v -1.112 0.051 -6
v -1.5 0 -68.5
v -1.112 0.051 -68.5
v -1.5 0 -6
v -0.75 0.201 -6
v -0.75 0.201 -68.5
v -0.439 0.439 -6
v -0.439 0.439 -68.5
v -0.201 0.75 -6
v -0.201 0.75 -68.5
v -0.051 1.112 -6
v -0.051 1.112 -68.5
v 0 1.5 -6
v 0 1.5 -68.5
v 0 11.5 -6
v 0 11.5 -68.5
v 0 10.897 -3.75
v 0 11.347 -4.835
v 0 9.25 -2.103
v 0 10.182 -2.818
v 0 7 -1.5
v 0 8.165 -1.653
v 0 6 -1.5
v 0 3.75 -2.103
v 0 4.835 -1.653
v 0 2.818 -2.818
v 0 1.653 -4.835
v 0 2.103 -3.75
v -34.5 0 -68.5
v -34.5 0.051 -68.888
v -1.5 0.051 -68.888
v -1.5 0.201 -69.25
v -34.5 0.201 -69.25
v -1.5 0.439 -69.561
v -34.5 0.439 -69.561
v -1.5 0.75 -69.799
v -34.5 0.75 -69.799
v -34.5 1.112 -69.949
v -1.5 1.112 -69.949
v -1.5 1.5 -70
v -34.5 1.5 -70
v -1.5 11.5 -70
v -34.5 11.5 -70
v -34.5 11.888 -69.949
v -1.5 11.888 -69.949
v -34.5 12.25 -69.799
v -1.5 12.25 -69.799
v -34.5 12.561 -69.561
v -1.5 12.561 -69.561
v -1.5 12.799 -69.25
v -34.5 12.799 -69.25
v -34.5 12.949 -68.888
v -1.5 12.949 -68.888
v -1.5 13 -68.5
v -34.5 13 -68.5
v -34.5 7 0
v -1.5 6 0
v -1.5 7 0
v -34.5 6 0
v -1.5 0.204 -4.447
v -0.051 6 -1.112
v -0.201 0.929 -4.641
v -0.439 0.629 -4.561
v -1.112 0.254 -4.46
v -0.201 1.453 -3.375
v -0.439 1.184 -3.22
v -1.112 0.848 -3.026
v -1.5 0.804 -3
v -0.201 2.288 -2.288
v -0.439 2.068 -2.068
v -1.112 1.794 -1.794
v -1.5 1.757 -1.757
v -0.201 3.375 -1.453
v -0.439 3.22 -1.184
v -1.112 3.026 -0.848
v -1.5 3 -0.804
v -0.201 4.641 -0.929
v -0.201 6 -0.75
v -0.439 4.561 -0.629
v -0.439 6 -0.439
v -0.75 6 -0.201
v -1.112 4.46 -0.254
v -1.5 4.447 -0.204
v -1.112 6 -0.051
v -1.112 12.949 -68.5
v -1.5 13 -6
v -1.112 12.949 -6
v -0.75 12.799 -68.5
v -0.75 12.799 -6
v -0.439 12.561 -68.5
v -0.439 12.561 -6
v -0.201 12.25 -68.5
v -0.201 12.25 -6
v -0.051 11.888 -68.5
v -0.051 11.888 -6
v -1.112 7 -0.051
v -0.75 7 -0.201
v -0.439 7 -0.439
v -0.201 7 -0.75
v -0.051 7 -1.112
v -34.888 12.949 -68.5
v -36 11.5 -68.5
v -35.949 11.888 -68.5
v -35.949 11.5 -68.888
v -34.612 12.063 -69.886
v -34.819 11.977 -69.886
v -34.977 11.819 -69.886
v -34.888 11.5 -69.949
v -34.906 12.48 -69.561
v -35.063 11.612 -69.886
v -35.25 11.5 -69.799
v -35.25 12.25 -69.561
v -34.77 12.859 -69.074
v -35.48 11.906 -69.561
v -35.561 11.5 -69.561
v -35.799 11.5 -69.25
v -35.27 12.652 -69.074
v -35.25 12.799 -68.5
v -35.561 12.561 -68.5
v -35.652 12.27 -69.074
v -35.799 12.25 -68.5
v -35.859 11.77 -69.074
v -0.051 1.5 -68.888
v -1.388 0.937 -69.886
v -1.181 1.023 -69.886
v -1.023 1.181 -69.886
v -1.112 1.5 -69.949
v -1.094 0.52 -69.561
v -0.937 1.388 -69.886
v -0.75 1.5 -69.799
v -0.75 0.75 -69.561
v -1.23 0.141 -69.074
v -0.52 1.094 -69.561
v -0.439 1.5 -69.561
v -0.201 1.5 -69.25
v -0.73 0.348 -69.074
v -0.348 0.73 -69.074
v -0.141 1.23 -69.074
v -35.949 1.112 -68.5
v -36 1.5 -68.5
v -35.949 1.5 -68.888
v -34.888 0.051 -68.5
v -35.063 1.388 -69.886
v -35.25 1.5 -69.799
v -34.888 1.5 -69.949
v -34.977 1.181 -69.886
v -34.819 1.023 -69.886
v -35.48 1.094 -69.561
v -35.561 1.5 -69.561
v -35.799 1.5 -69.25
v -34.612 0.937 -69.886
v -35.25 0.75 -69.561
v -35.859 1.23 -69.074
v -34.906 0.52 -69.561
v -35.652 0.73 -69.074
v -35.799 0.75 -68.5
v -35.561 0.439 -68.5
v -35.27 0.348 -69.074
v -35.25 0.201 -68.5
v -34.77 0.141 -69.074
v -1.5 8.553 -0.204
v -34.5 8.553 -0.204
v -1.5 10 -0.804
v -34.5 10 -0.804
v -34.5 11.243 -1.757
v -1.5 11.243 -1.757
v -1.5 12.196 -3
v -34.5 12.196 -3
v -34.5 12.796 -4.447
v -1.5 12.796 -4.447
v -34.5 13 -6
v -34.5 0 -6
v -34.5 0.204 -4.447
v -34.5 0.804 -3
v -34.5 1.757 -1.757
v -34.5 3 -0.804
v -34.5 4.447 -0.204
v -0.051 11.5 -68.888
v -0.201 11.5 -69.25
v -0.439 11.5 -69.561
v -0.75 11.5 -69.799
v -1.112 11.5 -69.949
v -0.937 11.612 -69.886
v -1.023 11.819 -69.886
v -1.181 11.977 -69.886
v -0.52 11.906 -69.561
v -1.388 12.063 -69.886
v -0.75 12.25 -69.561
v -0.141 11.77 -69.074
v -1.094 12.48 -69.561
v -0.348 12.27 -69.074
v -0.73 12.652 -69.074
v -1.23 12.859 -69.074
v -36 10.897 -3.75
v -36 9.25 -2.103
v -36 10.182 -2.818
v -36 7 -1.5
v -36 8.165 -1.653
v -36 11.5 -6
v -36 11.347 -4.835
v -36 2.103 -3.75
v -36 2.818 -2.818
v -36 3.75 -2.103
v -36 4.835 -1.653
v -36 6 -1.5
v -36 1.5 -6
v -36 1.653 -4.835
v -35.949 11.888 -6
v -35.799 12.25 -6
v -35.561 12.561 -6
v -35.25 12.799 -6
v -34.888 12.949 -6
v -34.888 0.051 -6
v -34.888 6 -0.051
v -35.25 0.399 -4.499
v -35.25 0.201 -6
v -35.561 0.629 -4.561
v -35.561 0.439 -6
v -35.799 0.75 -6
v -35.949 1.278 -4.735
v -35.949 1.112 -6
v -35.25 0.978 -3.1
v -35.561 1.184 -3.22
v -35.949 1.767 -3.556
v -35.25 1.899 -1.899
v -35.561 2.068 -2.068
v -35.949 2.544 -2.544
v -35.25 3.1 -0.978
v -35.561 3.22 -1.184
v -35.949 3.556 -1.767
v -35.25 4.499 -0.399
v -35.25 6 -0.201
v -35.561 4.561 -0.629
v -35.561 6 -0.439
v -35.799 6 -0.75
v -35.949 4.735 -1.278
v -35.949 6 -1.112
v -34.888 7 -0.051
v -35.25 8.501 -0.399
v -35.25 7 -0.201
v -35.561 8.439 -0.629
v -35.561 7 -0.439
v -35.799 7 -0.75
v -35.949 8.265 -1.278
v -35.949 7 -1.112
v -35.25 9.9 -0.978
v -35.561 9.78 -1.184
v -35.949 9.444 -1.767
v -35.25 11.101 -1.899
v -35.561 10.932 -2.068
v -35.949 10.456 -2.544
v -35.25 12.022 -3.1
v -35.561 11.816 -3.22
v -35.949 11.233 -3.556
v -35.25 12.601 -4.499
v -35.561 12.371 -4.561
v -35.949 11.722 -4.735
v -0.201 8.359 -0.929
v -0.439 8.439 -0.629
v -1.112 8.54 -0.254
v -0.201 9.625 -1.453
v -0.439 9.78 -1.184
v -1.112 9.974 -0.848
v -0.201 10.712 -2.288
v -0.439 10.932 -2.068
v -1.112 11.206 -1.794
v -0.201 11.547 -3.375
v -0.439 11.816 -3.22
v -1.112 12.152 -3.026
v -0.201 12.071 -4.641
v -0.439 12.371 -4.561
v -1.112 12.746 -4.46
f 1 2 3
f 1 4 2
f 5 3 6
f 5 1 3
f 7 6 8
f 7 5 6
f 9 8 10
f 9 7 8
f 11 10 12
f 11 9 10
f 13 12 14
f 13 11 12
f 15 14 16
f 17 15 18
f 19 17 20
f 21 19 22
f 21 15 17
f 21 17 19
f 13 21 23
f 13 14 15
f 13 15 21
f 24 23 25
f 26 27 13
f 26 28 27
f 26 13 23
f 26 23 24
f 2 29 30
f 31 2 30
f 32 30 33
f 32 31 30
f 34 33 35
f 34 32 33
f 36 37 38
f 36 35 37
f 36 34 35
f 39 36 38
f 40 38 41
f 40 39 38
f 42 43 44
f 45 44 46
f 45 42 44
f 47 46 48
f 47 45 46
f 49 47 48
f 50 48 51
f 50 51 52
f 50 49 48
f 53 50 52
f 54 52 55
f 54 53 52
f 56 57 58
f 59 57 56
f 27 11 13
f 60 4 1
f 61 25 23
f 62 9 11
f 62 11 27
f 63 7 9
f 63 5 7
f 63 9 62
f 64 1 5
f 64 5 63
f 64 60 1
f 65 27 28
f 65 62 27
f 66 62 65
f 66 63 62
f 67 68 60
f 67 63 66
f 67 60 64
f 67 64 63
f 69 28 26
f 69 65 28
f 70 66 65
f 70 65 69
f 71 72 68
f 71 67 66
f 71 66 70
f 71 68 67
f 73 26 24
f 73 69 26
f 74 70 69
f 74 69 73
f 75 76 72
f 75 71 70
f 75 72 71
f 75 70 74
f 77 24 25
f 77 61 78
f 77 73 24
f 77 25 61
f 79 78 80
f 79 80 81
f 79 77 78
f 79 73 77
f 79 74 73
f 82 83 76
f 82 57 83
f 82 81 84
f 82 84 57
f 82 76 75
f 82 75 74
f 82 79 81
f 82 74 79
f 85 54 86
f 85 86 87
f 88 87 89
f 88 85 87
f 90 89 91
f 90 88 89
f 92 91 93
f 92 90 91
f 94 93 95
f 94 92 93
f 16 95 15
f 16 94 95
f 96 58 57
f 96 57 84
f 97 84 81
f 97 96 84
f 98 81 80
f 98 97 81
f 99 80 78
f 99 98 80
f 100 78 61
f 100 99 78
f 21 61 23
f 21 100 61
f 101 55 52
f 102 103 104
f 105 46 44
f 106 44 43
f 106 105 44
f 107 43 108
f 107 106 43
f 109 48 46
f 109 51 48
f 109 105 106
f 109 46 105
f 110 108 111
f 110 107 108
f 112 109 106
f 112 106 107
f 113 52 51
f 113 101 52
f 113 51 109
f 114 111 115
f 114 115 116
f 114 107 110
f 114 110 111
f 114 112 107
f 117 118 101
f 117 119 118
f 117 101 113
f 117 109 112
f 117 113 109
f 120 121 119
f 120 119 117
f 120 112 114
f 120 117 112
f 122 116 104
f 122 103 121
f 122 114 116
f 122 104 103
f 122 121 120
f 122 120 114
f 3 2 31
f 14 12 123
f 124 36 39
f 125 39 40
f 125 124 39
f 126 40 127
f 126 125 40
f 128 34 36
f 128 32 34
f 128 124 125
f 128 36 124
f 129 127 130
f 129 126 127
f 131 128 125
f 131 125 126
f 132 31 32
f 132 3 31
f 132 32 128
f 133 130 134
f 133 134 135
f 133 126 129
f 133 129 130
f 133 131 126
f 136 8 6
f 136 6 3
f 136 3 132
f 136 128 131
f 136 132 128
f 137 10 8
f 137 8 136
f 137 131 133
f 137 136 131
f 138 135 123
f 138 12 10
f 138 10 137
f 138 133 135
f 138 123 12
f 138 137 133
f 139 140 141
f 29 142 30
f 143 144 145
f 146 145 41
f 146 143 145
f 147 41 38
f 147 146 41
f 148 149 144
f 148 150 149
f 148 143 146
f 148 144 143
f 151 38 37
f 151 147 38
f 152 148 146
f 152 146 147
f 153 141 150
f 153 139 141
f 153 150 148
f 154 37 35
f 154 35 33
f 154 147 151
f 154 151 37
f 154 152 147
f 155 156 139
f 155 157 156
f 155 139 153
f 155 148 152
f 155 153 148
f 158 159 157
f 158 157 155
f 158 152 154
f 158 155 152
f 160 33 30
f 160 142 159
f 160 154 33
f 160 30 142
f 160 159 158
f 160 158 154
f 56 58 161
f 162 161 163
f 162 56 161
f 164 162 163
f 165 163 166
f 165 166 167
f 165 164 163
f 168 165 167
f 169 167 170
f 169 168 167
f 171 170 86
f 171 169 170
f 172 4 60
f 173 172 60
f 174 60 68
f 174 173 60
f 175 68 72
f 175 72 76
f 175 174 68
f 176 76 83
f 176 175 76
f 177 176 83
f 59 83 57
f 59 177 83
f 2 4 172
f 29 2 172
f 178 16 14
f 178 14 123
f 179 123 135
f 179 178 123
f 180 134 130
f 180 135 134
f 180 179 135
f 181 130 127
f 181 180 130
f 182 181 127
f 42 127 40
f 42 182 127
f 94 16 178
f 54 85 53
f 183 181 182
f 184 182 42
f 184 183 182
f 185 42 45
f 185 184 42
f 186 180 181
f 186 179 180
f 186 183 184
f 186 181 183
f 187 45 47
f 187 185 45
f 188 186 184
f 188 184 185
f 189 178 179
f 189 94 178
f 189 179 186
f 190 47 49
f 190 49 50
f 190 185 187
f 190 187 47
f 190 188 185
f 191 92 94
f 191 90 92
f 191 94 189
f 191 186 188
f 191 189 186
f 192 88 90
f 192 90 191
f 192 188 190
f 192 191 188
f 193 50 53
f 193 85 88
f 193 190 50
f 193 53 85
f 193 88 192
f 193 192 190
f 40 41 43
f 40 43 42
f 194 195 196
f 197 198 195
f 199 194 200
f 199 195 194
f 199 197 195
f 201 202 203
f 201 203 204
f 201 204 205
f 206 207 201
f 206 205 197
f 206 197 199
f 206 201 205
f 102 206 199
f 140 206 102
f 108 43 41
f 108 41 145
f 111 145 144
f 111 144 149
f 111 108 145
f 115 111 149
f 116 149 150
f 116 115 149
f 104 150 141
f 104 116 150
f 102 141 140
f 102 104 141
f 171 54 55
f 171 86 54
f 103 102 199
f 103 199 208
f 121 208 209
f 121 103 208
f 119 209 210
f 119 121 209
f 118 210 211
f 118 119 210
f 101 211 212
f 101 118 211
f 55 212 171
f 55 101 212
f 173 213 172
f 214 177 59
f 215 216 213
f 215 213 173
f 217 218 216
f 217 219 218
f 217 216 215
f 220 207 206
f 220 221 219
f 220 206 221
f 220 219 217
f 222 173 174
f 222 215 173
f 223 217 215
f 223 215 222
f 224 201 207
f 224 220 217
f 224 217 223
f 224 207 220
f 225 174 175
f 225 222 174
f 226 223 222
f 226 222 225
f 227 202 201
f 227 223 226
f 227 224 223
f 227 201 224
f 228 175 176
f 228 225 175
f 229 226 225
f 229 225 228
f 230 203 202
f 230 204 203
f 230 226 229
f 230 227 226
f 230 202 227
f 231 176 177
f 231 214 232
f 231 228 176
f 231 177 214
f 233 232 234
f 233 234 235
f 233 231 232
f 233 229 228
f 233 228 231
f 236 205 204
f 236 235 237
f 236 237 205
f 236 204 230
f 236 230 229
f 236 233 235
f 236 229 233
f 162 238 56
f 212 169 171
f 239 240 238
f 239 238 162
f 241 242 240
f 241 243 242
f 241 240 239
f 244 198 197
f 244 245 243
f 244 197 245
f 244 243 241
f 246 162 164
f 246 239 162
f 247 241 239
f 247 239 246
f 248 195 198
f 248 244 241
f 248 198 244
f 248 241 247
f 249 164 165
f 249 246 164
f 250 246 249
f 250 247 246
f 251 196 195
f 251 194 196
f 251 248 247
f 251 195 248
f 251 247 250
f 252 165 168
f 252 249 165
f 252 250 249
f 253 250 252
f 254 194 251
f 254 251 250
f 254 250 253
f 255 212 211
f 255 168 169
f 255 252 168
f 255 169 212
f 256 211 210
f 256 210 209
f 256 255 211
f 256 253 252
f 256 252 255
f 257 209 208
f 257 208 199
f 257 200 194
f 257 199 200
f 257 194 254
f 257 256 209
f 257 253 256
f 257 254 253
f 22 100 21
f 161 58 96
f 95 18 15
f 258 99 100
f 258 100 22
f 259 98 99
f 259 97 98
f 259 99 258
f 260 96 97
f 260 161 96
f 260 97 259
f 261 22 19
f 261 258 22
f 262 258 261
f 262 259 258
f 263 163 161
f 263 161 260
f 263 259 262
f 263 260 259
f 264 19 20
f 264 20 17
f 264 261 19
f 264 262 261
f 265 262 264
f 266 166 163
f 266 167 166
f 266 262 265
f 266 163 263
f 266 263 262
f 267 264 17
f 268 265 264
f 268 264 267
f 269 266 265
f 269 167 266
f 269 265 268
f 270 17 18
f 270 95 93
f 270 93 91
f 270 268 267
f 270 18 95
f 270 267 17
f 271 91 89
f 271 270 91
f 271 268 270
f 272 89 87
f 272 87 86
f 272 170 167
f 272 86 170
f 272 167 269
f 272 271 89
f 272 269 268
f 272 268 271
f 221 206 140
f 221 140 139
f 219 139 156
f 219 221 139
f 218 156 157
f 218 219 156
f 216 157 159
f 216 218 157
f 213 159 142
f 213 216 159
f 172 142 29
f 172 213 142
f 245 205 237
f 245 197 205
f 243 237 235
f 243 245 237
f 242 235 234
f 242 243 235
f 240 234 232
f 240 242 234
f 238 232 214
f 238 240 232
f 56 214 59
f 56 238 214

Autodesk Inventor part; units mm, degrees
ref_plane "YZ Plane" through (0, 0, 0) normal (1, 0, 0) x (0, 1, 0)
ref_plane "XZ Plane" through (0, 0, 0) normal (0, 1, 0) x (-1, 0, 0)
ref_plane "XY Plane" through (0, 0, 0) normal (0, 0, 1) x (1, 0, 0)
sketch "Sketch1" plane through (0, 0, 0) normal (0, 1, 0) x (-1, 0, 0)
  line L0 (0, 0) -> (36, 0)
  line L1 (36, 0) -> (36, -70)
  line L2 (36, -70) -> (0, -70)
  line L3 (0, -70) -> (0, 0)
  dimension "d0" = 36
  dimension "d1" = 70
extrude "Extrusion1" add sketch "Sketch1" along normal blind 13
fillet "Fillet1" radius 6 2 edges at (-18, 13, 0) (-18, 0, 0)
fillet "Fillet2" radius 1.5 14 edges at (0, 11.2426, -1.7574) (0, 6.5, 0) (0, 1.7574, -1.7574) (0, 0, -38) (0, 13, -38) (-36, 11.2426, -1.7574) (-36, 6.5, 0) (-36, 1.7574, -1.7574) (-36, 0, -38) (-36, 13, -38) (0, 6.5, -70) (-18, 13, -70) (-36, 6.5, -70) (-18, 0, -70)
properties part number "LIPO 1050"
